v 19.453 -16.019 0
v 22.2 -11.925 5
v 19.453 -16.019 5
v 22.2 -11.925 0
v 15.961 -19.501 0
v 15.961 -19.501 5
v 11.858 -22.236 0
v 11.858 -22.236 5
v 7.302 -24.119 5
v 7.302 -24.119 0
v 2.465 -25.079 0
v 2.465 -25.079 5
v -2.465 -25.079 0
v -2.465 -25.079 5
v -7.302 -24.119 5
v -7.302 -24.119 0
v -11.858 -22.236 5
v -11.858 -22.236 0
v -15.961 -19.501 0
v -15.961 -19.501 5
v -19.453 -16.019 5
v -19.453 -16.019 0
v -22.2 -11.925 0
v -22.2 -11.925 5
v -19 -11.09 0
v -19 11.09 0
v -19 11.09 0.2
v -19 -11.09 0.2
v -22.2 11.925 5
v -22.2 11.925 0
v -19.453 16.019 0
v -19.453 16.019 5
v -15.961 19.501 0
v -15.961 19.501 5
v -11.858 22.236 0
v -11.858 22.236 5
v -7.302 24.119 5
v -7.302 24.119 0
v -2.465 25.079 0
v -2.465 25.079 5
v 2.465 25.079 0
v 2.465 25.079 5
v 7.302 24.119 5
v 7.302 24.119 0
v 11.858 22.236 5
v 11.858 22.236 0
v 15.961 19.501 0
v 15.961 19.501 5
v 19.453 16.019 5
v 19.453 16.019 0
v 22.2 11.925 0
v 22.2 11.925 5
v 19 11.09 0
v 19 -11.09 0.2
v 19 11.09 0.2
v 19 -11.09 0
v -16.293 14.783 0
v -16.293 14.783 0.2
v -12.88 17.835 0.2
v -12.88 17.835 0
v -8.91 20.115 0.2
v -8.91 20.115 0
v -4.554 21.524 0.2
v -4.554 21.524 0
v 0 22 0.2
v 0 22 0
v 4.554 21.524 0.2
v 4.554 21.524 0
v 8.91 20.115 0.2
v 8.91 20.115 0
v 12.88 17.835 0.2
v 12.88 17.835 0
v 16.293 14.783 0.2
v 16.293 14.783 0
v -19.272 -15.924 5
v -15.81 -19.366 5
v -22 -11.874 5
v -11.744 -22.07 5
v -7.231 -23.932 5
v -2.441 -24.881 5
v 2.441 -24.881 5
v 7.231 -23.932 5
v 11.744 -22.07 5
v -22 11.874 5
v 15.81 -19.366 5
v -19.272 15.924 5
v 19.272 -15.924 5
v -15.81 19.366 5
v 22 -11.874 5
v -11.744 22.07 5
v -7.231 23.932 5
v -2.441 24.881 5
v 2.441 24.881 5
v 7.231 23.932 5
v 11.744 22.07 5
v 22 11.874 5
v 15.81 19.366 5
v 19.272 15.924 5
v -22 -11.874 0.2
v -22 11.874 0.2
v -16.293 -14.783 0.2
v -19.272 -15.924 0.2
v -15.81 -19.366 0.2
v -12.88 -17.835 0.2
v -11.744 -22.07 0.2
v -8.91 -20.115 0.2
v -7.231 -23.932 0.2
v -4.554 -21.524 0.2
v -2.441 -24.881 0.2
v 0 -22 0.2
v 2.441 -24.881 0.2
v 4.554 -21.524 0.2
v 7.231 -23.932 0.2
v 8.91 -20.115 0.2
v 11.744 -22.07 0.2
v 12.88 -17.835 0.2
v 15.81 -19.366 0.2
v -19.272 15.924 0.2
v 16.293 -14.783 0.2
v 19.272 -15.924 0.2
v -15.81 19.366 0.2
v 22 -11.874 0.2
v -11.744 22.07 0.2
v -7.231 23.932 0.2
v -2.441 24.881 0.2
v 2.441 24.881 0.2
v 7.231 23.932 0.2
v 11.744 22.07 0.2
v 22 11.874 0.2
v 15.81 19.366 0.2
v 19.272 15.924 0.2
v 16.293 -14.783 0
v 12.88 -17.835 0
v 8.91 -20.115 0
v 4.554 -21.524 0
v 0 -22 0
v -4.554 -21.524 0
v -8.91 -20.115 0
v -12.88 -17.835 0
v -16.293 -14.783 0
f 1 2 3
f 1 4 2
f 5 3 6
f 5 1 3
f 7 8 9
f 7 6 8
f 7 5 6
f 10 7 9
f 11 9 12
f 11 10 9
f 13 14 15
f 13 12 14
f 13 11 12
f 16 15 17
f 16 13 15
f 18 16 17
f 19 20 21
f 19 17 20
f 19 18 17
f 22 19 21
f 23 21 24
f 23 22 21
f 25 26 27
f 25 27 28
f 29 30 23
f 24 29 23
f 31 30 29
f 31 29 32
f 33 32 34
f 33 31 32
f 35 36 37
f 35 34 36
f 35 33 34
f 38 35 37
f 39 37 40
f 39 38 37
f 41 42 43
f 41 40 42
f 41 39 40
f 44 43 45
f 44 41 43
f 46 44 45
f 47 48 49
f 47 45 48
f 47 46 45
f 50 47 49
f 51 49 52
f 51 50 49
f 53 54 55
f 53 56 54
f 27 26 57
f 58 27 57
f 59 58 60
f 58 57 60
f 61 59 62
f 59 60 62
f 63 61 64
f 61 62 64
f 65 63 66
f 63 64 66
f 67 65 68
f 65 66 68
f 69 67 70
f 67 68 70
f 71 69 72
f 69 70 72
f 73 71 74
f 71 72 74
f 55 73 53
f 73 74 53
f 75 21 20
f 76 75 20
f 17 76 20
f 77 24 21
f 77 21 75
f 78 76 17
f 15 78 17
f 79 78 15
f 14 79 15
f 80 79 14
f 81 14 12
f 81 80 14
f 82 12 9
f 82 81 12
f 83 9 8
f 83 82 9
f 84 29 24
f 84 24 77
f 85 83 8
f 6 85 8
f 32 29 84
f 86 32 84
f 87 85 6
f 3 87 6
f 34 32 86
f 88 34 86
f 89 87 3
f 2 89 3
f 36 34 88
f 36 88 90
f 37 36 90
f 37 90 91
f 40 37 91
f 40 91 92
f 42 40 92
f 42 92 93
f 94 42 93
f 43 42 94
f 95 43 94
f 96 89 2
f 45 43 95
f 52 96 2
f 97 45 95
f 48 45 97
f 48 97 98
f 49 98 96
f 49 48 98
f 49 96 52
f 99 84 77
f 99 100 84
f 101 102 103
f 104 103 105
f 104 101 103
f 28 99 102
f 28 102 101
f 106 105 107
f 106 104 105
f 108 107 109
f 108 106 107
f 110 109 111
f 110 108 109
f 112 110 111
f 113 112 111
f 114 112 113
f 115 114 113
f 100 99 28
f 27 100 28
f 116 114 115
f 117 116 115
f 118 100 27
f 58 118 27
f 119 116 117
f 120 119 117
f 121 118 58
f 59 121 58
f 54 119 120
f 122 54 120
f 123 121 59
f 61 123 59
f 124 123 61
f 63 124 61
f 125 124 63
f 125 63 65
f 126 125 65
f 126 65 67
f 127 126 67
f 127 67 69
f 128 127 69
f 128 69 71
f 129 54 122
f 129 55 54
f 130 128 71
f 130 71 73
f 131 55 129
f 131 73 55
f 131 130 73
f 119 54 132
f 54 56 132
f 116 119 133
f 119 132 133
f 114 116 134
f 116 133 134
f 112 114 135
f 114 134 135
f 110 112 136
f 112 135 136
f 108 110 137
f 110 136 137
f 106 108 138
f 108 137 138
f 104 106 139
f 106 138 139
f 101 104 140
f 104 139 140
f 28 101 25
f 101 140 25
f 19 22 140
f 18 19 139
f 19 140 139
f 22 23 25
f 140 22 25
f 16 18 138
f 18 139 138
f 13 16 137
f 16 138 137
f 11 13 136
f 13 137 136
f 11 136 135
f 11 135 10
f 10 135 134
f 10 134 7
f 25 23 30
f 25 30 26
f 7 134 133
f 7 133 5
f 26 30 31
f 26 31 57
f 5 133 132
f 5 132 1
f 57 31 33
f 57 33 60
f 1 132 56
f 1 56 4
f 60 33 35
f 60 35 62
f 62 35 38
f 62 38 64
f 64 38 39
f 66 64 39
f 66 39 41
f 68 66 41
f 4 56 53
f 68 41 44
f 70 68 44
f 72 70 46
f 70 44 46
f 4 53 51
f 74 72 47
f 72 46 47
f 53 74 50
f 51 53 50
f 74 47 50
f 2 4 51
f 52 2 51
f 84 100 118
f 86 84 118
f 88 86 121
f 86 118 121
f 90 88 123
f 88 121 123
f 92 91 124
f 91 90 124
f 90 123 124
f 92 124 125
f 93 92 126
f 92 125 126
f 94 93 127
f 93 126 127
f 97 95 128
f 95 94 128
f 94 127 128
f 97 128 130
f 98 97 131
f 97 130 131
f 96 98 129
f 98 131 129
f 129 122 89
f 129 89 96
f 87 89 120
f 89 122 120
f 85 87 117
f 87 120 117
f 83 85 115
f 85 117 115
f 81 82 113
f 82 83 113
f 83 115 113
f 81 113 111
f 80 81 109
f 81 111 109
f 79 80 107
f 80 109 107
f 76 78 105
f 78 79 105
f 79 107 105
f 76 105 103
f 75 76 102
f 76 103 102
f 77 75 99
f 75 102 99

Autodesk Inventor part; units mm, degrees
ref_plane "YZ Plane" through (0, 0, 0) normal (1, 0, 0) x (0, 1, 0)
ref_plane "XZ Plane" through (0, 0, 0) normal (0, 1, 0) x (-1, 0, 0)
ref_plane "XY Plane" through (0, 0, 0) normal (0, 0, 1) x (1, 0, 0)
sketch "Sketch1" plane through (0, 0, 0) normal (0, 0, 1) x (1, 0, 0)
  arc A0 (22, 11.8743) -> (-22, 11.8743) centre (0, 0) ccw
  arc A1 (-22, -11.8743) -> (22, -11.8743) centre (0, 0) ccw
  line L0 (-22, 11.8743) -> (-22, -11.8743)
  line L1 (22, -11.8743) -> (22, 11.8743)
  line L2 (-22.2, 11.9248) -> (-22.2, -11.9248)
  arc A2 (-22.2, -11.9248) -> (22.2, -11.9248) centre (0, 0) ccw
  line L3 (22.2, -11.9248) -> (22.2, 11.9248)
  arc A3 (22.2, 11.9248) -> (-22.2, 11.9248) centre (0, 0) ccw
  line L4 (-19, 11.0905) -> (-19, -11.0905)
  arc A4 (-19, -11.0905) -> (19, -11.0905) centre (0, 0) ccw
  line L5 (19, -11.0905) -> (19, 11.0905)
  arc A5 (19, 11.0905) -> (-19, 11.0905) centre (0, 0) ccw
  point P0 (-22, 0)
  point P1 (22, 0)
  dimension "d1" = 44
  dimension "d2" = 50
  dimension "d3" = 3
  dimension "d4" = 0.2
extrude "Extrusion1" add sketch "Sketch1" along normal blind 0.2 contours L1 A1 L0 A0
extrude "Extrusion2" add sketch "Sketch1" along normal blind 5 contours A3 L3 A2 L2
equation "\"d4\" = thickness"
equation "\"d5\" = thickness"
equation "\"thickness\" = 0.2"
properties part number "probe-gate-mesh" material "Stainless Steel"
